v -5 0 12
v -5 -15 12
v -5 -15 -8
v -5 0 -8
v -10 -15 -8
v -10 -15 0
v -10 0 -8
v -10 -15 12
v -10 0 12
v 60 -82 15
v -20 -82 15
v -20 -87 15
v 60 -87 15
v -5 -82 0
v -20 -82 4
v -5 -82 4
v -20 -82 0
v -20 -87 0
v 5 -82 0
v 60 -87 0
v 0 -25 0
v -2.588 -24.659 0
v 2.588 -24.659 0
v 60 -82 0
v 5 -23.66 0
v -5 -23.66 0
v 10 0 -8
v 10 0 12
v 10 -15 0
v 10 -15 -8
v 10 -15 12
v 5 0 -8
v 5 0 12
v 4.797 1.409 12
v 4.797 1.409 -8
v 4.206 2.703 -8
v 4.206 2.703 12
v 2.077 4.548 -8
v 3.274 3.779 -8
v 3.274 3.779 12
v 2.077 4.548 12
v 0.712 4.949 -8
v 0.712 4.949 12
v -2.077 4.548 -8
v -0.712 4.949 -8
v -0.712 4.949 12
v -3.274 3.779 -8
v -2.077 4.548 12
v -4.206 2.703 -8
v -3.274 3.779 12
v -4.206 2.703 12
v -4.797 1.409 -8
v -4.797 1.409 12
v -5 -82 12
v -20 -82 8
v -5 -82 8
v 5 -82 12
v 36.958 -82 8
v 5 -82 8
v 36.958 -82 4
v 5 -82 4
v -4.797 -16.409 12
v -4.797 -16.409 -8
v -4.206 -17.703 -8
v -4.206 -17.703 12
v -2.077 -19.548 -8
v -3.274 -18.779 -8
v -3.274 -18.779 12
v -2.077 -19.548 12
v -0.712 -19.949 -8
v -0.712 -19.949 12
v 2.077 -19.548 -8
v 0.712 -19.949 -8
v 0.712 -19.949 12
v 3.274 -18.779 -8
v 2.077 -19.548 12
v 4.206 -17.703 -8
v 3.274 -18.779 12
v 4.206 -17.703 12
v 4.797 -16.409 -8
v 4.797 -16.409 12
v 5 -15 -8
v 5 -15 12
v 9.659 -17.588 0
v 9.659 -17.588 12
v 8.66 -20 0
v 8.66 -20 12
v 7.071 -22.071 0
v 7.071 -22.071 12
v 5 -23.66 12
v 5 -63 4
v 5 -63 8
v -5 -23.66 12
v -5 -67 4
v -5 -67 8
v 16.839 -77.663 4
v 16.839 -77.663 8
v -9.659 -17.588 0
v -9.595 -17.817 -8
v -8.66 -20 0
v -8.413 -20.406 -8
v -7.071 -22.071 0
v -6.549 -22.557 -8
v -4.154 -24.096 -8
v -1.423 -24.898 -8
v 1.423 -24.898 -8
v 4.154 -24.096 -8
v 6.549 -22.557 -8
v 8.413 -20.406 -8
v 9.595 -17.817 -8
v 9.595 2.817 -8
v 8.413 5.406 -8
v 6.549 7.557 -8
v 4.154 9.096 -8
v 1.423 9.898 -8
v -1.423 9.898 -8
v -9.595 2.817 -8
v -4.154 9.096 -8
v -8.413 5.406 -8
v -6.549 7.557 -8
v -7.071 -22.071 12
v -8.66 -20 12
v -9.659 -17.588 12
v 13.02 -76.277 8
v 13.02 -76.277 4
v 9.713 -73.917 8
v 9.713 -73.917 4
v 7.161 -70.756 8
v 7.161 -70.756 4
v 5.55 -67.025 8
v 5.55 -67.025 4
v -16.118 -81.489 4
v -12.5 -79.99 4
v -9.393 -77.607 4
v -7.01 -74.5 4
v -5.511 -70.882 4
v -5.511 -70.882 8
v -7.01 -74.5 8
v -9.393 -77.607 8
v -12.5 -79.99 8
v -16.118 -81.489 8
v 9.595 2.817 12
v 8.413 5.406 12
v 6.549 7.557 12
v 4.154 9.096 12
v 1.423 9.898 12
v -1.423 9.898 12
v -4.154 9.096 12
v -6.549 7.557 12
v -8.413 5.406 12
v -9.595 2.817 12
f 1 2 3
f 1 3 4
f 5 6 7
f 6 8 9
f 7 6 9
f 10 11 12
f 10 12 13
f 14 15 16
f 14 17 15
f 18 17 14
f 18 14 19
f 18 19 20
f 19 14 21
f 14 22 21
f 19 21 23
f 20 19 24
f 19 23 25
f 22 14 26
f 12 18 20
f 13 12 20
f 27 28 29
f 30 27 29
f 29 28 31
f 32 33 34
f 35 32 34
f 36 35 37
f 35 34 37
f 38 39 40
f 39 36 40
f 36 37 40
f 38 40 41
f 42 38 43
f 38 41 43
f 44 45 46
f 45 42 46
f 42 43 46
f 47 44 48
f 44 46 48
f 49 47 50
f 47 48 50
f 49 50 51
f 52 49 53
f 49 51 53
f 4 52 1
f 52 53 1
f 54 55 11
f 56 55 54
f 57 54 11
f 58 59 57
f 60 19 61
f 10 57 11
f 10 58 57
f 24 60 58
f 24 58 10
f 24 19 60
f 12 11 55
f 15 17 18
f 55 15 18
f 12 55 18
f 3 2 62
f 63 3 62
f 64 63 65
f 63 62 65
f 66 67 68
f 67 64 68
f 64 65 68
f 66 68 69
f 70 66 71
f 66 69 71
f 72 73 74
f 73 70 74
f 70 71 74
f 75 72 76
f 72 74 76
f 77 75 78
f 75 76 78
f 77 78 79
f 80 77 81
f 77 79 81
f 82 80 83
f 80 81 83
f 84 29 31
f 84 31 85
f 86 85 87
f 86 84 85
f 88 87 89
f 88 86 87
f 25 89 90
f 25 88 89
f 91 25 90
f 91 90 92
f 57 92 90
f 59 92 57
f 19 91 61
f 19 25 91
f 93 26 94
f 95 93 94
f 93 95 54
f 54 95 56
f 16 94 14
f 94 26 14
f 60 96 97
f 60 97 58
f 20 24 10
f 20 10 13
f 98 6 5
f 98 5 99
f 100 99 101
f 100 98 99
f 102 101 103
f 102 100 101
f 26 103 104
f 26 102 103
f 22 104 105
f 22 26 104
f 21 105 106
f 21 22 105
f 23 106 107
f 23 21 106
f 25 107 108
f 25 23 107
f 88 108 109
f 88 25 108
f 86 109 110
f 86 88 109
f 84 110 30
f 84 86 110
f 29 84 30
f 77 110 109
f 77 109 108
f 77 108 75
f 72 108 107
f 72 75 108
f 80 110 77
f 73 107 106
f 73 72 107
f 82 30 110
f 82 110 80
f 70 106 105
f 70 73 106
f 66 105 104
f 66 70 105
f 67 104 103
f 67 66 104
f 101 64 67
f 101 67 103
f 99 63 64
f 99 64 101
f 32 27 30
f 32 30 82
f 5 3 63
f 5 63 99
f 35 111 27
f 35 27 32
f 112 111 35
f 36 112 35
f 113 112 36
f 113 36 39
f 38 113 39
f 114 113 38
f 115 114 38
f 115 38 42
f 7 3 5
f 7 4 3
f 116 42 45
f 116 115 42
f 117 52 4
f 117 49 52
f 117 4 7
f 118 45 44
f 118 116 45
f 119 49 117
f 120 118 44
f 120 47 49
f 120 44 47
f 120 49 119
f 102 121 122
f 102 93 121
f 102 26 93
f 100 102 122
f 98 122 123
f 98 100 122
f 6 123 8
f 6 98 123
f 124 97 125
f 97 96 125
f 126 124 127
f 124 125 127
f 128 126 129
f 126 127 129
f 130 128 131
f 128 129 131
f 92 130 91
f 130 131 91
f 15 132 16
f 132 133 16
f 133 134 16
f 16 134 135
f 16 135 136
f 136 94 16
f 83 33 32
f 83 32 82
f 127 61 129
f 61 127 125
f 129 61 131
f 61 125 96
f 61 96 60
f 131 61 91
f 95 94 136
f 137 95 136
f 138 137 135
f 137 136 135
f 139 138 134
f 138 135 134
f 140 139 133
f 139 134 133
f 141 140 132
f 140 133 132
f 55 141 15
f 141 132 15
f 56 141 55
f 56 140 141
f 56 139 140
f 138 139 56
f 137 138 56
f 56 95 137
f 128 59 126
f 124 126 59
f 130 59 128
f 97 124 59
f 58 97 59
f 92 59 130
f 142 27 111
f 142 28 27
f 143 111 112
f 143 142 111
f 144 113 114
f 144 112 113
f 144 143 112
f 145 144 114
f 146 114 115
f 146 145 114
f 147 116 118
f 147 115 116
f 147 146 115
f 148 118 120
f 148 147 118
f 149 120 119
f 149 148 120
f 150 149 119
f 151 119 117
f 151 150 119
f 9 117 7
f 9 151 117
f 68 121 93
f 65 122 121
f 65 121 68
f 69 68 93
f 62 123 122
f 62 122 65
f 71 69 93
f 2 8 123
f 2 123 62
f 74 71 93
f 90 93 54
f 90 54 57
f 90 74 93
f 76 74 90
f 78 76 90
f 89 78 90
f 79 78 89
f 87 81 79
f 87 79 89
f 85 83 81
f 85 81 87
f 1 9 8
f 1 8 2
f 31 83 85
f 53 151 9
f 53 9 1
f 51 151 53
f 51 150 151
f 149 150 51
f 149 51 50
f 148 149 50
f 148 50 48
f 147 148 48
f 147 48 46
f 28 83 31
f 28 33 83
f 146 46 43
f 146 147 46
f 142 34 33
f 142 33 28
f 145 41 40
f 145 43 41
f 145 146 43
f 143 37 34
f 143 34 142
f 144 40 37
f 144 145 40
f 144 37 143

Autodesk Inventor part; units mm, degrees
ref_plane "YZ Plane" through (0, 0, 0) normal (1, 0, 0) x (0, 1, 0)
ref_plane "XZ Plane" through (0, 0, 0) normal (0, 1, 0) x (-1, 0, 0)
sketch "Sketch1" plane through (0, 0, 0) normal (0, 0, 1) x (1, 0, 0)
  line L0 (0, 0) -> (0, -15) construction
  line L1 (-5, 0) -> (-5, -15)
  line L2 (5, -15) -> (5, 0)
  arc A0 (5, 0) -> (-5, 0) centre (0, 0) ccw
  arc A1 (-5, -15) -> (5, -15) centre (0, -15) ccw
  line L3 (0, 0) -> (0, -15) construction
  line L4 (-10, 0) -> (-10, -15)
  line L5 (10, -15) -> (10, 0)
  arc A2 (10, 0) -> (-10, 0) centre (0, 0) ccw
  line L6 (0, -15) -> (0, -87) construction
  line L7 (5, -23.6603) -> (5, -82)
  line L8 (-5, -23.6603) -> (-5, -82)
  arc A3 (-10, -15) -> (-5, -23.6603) centre (0, -15) ccw
  arc A4 (5, -23.6603) -> (10, -15) centre (0, -15) ccw
  line L9 (-20, -82) -> (60, -82)
  line L10 (60, -82) -> (60, -87)
  line L11 (60, -87) -> (-20, -87)
  line L12 (-20, -87) -> (-20, -82)
  point P0 (0, -7.5)
  point P1 (0, -7.5)
  dimension "d0" = 15
  dimension "d1" = 5
  dimension "d2" = 10
  dimension "d3" = 72
  dimension "d4" = 5
  dimension "d5" = 5
  dimension "d7" = 80
  dimension "d8" = 5
  dimension "d24" = 15
extrude "Extrusion1" add sketch "Sketch1" along normal blind 12
sketch "Sketch2" plane through (0, 0, 0) normal (0, 0, -1) x (-1, 0, 0)
  arc A0 (-5, -15) -> (5, -15) centre (0, -15) ccw projected
  line L0 (0, 0) -> (0, -15) construction
  line L1 (-10, 0) -> (-10, -15)
  line L2 (10, -15) -> (10, 0)
  arc A1 (10, 0) -> (-10, 0) centre (0, 0) ccw
  arc A2 (-10, -15) -> (10, -15) centre (0, -15) ccw
  line L3 (0, 0) -> (0, -15) construction
  line L4 (-5, 0) -> (-5, -15)
  line L5 (5, -15) -> (5, 0)
  arc A3 (5, 0) -> (-5, 0) centre (0, 0) ccw
  arc A4 (-5, -15) -> (5, -15) centre (0, -15) ccw
  point P0 (0, -7.5)
  point P1 (0, -7.5)
  point P2 (-5, -15)
  point P3 (5, -15)
  dimension "d11" = 10
  dimension "d12" = 5
extrude "Extrusion2" add sketch "Sketch2" along normal blind 8
sketch "Sketch3" plane through (0, 0, 12) normal (0, 0, 1) x (1, 0, 0)
  line L0 (-20, -82) -> (-20, -87) projected
  line L1 (-20, -87) -> (60, -87) projected
  line L2 (-20, -82) -> (60, -82)
  line L3 (60, -82) -> (60, -87)
  line L4 (60, -87) -> (-20, -87)
  line L5 (-20, -87) -> (-20, -82)
  point P0 (0, 0)
  dimension "d23" = 80
extrude "Extrusion3" add sketch "Sketch3" along normal blind 3
ref_plane "Work Plane1" through (0, 0, 6) normal (0, 0, 1) x (1, 0, 0)
sketch "Sketch4" plane through (0, 0, 6) normal (0, 0, 1) x (1, 0, 0)
  arc A0 (-20, -82) -> (-5, -67) centre (-20, -67) ccw
  line L0 (-5, -23.6603) -> (-5, -82) projected
  line L1 (60, -82) -> (-20, -82) projected
  line L2 (-5, -67) -> (-20, -67) construction
  line L3 (-20, -67) -> (-20, -82) construction
  line L4 (-20, -82) -> (-5, -82)
  line L5 (-5, -82) -> (-5, -67)
  arc A1 (5, -63) -> (16.8392, -77.6632) centre (20, -63) ccw
  line L6 (5, -82) -> (5, -23.6603) projected
  line L7 (16.8392, -77.6632) -> (36.9579, -82)
  line L8 (5, -82) -> (5, -63)
  point P0 (0, 0)
  point P1 (-20, -82)
  dimension "d17" = 15
  dimension "d18" = 30
  dimension "d20" = 19
extrude "Extrusion4" add sketch "Sketch4" along normal mid plane 4
properties part number "Stand"
